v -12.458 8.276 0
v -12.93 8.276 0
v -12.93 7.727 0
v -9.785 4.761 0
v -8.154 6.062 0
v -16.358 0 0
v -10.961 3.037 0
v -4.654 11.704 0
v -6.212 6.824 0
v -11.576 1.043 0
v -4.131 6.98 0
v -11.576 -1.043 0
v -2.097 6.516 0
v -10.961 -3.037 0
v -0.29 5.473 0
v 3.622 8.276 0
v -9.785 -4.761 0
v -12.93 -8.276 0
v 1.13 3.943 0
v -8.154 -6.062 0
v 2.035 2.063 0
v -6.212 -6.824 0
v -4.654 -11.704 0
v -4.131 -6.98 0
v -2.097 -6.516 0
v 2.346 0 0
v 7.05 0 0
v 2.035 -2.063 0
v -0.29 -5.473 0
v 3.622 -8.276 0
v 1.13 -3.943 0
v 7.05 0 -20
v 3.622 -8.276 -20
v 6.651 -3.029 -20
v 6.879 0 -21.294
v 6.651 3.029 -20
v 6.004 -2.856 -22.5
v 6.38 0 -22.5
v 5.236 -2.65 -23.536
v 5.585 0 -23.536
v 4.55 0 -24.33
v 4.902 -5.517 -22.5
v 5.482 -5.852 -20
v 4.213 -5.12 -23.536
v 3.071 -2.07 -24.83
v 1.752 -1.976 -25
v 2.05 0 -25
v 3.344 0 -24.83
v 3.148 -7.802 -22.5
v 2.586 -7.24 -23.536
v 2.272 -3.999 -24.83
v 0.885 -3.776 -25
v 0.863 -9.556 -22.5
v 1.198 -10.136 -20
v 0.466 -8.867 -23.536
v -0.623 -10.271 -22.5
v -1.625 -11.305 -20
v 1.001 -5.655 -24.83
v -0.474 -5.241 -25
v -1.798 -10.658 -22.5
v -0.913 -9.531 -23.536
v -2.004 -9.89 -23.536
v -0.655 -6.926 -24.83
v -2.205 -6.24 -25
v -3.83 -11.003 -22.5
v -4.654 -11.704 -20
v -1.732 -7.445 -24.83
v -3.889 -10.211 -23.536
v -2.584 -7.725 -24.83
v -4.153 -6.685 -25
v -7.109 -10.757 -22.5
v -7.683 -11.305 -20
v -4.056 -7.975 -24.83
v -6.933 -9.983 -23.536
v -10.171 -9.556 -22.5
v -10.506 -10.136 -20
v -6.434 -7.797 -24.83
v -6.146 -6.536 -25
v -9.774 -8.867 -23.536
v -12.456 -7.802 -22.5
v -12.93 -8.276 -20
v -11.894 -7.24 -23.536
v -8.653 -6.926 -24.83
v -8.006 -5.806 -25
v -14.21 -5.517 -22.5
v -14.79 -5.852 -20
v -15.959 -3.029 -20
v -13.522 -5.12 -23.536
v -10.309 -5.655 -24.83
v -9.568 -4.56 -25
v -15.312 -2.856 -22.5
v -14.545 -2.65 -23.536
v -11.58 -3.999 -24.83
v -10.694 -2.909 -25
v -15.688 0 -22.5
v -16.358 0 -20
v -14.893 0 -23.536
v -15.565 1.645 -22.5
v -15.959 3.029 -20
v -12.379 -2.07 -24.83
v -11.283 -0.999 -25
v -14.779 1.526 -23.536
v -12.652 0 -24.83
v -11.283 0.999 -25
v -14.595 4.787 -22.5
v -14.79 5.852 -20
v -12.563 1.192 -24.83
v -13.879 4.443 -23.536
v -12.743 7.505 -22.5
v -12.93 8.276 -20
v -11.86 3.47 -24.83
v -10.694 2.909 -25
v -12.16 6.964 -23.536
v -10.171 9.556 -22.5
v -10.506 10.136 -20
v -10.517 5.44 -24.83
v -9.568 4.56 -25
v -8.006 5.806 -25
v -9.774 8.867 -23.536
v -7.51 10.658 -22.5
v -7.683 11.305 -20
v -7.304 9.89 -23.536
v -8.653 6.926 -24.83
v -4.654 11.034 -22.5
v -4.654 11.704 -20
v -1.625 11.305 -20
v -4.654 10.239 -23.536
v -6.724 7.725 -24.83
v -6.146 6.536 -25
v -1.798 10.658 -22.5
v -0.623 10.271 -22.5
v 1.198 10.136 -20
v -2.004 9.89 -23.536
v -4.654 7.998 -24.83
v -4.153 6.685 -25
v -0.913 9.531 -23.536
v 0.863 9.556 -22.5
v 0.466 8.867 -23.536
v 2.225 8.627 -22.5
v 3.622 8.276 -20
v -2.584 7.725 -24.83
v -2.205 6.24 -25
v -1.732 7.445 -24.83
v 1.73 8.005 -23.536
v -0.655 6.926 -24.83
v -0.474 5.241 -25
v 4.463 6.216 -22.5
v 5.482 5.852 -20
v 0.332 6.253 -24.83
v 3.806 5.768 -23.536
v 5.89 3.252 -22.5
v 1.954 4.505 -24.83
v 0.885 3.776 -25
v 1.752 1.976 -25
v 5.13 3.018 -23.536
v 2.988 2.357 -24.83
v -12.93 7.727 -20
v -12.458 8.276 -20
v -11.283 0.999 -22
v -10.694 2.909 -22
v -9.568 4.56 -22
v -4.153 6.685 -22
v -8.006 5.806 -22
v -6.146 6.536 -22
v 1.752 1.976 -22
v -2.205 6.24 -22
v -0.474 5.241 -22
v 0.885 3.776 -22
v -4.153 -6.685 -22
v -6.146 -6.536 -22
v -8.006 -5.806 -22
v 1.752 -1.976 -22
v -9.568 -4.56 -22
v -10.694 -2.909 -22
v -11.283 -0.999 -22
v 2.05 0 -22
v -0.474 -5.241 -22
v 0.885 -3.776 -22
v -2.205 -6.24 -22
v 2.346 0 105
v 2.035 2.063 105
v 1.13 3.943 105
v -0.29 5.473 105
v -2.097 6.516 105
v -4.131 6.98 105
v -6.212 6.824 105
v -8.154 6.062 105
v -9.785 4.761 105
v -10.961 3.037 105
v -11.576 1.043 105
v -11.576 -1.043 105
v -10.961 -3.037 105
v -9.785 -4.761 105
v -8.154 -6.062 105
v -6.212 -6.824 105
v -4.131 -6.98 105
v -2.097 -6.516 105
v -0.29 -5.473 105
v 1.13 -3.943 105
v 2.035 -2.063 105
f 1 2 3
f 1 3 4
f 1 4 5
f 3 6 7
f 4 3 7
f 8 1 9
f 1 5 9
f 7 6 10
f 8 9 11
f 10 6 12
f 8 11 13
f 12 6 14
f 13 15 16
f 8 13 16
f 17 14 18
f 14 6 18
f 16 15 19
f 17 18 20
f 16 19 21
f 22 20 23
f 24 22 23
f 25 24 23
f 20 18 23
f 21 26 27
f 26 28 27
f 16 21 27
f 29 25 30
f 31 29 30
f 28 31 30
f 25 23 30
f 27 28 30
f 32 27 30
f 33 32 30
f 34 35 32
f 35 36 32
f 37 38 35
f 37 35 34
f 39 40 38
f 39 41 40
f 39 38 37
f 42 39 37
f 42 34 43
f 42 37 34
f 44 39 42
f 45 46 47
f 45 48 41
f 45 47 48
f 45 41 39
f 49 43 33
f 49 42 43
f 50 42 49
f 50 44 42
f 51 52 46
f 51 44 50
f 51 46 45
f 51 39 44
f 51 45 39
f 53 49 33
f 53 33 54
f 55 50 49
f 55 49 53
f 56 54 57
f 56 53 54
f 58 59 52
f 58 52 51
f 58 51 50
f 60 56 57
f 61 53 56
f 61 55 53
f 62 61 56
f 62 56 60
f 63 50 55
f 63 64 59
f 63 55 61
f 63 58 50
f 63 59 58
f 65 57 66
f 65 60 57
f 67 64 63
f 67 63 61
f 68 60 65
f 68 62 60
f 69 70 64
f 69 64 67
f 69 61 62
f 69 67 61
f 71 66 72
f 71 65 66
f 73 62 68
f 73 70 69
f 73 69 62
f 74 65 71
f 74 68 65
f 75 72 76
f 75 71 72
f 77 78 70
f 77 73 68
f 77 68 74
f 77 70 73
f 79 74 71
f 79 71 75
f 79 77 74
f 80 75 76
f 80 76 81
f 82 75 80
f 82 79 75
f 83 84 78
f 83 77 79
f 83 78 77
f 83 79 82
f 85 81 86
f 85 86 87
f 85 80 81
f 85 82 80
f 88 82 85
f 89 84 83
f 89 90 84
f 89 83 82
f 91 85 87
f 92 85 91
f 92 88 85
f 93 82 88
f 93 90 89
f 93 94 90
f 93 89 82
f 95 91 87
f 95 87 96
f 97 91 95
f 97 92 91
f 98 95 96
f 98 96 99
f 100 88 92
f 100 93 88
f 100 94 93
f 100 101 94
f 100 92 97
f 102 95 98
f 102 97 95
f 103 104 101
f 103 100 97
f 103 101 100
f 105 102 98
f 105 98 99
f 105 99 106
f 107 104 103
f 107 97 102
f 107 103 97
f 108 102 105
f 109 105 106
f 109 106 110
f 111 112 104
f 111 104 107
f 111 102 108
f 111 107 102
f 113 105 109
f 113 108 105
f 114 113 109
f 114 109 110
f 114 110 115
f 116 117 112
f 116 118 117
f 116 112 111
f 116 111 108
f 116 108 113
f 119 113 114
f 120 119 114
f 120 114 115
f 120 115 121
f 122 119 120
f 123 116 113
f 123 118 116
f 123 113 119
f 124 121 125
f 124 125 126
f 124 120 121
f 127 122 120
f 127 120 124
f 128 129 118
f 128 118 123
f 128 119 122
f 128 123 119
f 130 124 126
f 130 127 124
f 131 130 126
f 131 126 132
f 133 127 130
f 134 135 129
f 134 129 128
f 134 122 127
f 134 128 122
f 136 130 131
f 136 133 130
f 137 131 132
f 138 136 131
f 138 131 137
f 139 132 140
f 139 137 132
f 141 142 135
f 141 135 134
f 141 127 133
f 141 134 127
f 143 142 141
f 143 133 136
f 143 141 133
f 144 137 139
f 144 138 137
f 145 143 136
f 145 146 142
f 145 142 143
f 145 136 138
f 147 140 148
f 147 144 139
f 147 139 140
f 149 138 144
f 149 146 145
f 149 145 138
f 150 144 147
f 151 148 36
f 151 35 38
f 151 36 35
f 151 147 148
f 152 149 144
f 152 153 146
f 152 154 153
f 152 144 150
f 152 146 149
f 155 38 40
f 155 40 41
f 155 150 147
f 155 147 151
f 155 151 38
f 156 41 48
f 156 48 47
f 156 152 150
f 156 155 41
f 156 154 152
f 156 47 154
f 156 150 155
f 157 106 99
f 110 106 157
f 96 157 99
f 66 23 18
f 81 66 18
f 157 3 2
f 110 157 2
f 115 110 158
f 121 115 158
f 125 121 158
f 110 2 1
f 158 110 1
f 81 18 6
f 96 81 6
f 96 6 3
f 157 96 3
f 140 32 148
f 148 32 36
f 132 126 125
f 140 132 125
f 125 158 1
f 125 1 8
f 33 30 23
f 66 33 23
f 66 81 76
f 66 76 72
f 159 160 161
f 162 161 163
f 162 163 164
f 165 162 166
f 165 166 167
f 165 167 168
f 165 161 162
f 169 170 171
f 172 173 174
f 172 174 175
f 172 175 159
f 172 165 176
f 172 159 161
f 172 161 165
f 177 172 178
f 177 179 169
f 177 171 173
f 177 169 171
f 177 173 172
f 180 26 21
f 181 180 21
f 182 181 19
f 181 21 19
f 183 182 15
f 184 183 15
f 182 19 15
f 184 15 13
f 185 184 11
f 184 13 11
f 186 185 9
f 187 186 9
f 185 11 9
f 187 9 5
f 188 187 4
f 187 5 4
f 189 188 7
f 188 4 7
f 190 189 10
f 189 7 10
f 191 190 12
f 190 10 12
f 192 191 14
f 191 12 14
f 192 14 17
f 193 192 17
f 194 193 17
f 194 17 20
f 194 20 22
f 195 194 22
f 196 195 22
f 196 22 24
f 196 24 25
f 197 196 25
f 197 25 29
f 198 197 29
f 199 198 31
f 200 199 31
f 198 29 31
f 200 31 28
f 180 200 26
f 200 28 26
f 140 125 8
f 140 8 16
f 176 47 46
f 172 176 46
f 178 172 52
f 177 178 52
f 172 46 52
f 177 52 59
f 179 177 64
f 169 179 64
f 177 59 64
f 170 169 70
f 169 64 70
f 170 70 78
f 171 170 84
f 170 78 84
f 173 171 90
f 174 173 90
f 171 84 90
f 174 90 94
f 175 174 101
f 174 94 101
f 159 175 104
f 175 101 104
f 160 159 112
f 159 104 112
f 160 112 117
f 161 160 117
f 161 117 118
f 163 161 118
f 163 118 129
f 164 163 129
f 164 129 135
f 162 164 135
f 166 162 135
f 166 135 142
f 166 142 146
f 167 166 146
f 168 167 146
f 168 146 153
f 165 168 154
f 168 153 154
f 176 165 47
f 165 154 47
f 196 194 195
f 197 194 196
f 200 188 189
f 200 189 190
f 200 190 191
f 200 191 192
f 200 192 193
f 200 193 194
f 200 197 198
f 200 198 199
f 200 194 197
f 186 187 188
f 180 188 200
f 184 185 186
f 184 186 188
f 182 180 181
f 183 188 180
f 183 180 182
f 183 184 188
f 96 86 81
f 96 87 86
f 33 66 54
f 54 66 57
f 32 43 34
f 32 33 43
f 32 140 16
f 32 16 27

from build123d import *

# Parameters (mm, degrees)
F0_R     = 7
F1_DEPTH = 105
F2_R     = 11.7037675531
F2_R_2   = 7
F3_DEPTH = 25
F4_R     = 5
F6_DEPTH = 20
F7_DEPTH = 3


with BuildPart() as f1:
    # F0 (on Top) → F1 (new body)
    with BuildSketch(Plane.XY):
        with Locations((-4.6541057527, 0)):
            Circle(F0_R)
    extrude(amount=F1_DEPTH)

    # F2 (on face) → F3 (join)
    with BuildSketch(Plane(origin=(0, 0, 0), x_dir=(1, 0, 0), z_dir=(0, 0, -1))):
        with Locations((-4.6541057527, 0)):
            Circle(F2_R)
        with Locations((-4.6541057527, 0)):
            Circle(F2_R_2, mode=Mode.SUBTRACT)
        with Locations((-4.6541057527, 0)):
            Circle(F2_R_2)
    extrude(amount=F3_DEPTH)

    # F4
    f4_edges = [f1.edges().sort_by_distance(p)[0] for p in [
        (-16.357873, 0, -25),
    ]]
    fillet(f4_edges, radius=F4_R)

    # F5 (on face) → F6 (cut)
    with BuildSketch(Plane.XY):
        with BuildLine():
            Line((-12.4576410745, 8.2758134023), (-4.6541057527, 11.7037675531))
            ThreePointArc((-4.6541057527, 11.7037675531), (-9.1329436915, 10.8128712956), (-12.929919155, 8.2758134023))
            Line((-12.929919155, 8.2758134023), (-12.4576410745, 8.2758134023))
        make_face()
        with BuildLine():
            ThreePointArc((-12.929919155, 8.2758134023), (-15.4669770483, 4.4788379388), (-16.3578733058, 0))
            Line((-16.3578733058, 0), (-12.929919155, 7.727174844))
            Line((-12.929919155, 7.727174844), (-12.929919155, 8.2758134023))
        make_face()
        with BuildLine():
            ThreePointArc((3.6217076495, 8.2758134023), (-0.1752678139, 10.8128712956), (-4.6541057527, 11.7037675531))
            Line((-4.6541057527, 11.7037675531), (3.6217076495, 8.2758134023))
        make_face()
        with BuildLine():
            Line((3.6217076495, 8.2758134023), (7.0496618004, 0))
            ThreePointArc((7.0496618004, 0), (6.1587655429, 4.4788379388), (3.6217076495, 8.2758134023))
        make_face()
        with BuildLine():
            ThreePointArc((3.6217076495, -8.2758134023), (6.1587655429, -4.4788379388), (7.0496618004, 0))
            Line((7.0496618004, 0), (3.6217076495, -8.2758134023))
        make_face()
        with BuildLine():
            Line((3.6217076495, -8.2758134023), (-4.6541057527, -11.7037675531))
            ThreePointArc((-4.6541057527, -11.7037675531), (-0.1752678139, -10.8128712956), (3.6217076495, -8.2758134023))
        make_face()
        with BuildLine():
            Line((-12.929919155, -8.2758134023), (-16.3578733058, 0))
            ThreePointArc((-16.3578733058, 0), (-15.4669770483, -4.4788379388), (-12.929919155, -8.2758134023))
        make_face()
        with BuildLine():
            ThreePointArc((-12.929919155, -8.2758134023), (-9.1329436915, -10.8128712956), (-4.6541057527, -11.7037675531))
            Line((-4.6541057527, -11.7037675531), (-12.929919155, -8.2758134023))
        make_face()
    extrude(amount=-F6_DEPTH, mode=Mode.SUBTRACT)

    # F7 (cut): a face of the model
    f7_faces = [f1.faces().sort_by_distance(p)[0] for p in [
        (-4.6541057527, 0, -25),
    ]]
    extrude(f7_faces, amount=-F7_DEPTH, mode=Mode.SUBTRACT)


solid = f1.part
